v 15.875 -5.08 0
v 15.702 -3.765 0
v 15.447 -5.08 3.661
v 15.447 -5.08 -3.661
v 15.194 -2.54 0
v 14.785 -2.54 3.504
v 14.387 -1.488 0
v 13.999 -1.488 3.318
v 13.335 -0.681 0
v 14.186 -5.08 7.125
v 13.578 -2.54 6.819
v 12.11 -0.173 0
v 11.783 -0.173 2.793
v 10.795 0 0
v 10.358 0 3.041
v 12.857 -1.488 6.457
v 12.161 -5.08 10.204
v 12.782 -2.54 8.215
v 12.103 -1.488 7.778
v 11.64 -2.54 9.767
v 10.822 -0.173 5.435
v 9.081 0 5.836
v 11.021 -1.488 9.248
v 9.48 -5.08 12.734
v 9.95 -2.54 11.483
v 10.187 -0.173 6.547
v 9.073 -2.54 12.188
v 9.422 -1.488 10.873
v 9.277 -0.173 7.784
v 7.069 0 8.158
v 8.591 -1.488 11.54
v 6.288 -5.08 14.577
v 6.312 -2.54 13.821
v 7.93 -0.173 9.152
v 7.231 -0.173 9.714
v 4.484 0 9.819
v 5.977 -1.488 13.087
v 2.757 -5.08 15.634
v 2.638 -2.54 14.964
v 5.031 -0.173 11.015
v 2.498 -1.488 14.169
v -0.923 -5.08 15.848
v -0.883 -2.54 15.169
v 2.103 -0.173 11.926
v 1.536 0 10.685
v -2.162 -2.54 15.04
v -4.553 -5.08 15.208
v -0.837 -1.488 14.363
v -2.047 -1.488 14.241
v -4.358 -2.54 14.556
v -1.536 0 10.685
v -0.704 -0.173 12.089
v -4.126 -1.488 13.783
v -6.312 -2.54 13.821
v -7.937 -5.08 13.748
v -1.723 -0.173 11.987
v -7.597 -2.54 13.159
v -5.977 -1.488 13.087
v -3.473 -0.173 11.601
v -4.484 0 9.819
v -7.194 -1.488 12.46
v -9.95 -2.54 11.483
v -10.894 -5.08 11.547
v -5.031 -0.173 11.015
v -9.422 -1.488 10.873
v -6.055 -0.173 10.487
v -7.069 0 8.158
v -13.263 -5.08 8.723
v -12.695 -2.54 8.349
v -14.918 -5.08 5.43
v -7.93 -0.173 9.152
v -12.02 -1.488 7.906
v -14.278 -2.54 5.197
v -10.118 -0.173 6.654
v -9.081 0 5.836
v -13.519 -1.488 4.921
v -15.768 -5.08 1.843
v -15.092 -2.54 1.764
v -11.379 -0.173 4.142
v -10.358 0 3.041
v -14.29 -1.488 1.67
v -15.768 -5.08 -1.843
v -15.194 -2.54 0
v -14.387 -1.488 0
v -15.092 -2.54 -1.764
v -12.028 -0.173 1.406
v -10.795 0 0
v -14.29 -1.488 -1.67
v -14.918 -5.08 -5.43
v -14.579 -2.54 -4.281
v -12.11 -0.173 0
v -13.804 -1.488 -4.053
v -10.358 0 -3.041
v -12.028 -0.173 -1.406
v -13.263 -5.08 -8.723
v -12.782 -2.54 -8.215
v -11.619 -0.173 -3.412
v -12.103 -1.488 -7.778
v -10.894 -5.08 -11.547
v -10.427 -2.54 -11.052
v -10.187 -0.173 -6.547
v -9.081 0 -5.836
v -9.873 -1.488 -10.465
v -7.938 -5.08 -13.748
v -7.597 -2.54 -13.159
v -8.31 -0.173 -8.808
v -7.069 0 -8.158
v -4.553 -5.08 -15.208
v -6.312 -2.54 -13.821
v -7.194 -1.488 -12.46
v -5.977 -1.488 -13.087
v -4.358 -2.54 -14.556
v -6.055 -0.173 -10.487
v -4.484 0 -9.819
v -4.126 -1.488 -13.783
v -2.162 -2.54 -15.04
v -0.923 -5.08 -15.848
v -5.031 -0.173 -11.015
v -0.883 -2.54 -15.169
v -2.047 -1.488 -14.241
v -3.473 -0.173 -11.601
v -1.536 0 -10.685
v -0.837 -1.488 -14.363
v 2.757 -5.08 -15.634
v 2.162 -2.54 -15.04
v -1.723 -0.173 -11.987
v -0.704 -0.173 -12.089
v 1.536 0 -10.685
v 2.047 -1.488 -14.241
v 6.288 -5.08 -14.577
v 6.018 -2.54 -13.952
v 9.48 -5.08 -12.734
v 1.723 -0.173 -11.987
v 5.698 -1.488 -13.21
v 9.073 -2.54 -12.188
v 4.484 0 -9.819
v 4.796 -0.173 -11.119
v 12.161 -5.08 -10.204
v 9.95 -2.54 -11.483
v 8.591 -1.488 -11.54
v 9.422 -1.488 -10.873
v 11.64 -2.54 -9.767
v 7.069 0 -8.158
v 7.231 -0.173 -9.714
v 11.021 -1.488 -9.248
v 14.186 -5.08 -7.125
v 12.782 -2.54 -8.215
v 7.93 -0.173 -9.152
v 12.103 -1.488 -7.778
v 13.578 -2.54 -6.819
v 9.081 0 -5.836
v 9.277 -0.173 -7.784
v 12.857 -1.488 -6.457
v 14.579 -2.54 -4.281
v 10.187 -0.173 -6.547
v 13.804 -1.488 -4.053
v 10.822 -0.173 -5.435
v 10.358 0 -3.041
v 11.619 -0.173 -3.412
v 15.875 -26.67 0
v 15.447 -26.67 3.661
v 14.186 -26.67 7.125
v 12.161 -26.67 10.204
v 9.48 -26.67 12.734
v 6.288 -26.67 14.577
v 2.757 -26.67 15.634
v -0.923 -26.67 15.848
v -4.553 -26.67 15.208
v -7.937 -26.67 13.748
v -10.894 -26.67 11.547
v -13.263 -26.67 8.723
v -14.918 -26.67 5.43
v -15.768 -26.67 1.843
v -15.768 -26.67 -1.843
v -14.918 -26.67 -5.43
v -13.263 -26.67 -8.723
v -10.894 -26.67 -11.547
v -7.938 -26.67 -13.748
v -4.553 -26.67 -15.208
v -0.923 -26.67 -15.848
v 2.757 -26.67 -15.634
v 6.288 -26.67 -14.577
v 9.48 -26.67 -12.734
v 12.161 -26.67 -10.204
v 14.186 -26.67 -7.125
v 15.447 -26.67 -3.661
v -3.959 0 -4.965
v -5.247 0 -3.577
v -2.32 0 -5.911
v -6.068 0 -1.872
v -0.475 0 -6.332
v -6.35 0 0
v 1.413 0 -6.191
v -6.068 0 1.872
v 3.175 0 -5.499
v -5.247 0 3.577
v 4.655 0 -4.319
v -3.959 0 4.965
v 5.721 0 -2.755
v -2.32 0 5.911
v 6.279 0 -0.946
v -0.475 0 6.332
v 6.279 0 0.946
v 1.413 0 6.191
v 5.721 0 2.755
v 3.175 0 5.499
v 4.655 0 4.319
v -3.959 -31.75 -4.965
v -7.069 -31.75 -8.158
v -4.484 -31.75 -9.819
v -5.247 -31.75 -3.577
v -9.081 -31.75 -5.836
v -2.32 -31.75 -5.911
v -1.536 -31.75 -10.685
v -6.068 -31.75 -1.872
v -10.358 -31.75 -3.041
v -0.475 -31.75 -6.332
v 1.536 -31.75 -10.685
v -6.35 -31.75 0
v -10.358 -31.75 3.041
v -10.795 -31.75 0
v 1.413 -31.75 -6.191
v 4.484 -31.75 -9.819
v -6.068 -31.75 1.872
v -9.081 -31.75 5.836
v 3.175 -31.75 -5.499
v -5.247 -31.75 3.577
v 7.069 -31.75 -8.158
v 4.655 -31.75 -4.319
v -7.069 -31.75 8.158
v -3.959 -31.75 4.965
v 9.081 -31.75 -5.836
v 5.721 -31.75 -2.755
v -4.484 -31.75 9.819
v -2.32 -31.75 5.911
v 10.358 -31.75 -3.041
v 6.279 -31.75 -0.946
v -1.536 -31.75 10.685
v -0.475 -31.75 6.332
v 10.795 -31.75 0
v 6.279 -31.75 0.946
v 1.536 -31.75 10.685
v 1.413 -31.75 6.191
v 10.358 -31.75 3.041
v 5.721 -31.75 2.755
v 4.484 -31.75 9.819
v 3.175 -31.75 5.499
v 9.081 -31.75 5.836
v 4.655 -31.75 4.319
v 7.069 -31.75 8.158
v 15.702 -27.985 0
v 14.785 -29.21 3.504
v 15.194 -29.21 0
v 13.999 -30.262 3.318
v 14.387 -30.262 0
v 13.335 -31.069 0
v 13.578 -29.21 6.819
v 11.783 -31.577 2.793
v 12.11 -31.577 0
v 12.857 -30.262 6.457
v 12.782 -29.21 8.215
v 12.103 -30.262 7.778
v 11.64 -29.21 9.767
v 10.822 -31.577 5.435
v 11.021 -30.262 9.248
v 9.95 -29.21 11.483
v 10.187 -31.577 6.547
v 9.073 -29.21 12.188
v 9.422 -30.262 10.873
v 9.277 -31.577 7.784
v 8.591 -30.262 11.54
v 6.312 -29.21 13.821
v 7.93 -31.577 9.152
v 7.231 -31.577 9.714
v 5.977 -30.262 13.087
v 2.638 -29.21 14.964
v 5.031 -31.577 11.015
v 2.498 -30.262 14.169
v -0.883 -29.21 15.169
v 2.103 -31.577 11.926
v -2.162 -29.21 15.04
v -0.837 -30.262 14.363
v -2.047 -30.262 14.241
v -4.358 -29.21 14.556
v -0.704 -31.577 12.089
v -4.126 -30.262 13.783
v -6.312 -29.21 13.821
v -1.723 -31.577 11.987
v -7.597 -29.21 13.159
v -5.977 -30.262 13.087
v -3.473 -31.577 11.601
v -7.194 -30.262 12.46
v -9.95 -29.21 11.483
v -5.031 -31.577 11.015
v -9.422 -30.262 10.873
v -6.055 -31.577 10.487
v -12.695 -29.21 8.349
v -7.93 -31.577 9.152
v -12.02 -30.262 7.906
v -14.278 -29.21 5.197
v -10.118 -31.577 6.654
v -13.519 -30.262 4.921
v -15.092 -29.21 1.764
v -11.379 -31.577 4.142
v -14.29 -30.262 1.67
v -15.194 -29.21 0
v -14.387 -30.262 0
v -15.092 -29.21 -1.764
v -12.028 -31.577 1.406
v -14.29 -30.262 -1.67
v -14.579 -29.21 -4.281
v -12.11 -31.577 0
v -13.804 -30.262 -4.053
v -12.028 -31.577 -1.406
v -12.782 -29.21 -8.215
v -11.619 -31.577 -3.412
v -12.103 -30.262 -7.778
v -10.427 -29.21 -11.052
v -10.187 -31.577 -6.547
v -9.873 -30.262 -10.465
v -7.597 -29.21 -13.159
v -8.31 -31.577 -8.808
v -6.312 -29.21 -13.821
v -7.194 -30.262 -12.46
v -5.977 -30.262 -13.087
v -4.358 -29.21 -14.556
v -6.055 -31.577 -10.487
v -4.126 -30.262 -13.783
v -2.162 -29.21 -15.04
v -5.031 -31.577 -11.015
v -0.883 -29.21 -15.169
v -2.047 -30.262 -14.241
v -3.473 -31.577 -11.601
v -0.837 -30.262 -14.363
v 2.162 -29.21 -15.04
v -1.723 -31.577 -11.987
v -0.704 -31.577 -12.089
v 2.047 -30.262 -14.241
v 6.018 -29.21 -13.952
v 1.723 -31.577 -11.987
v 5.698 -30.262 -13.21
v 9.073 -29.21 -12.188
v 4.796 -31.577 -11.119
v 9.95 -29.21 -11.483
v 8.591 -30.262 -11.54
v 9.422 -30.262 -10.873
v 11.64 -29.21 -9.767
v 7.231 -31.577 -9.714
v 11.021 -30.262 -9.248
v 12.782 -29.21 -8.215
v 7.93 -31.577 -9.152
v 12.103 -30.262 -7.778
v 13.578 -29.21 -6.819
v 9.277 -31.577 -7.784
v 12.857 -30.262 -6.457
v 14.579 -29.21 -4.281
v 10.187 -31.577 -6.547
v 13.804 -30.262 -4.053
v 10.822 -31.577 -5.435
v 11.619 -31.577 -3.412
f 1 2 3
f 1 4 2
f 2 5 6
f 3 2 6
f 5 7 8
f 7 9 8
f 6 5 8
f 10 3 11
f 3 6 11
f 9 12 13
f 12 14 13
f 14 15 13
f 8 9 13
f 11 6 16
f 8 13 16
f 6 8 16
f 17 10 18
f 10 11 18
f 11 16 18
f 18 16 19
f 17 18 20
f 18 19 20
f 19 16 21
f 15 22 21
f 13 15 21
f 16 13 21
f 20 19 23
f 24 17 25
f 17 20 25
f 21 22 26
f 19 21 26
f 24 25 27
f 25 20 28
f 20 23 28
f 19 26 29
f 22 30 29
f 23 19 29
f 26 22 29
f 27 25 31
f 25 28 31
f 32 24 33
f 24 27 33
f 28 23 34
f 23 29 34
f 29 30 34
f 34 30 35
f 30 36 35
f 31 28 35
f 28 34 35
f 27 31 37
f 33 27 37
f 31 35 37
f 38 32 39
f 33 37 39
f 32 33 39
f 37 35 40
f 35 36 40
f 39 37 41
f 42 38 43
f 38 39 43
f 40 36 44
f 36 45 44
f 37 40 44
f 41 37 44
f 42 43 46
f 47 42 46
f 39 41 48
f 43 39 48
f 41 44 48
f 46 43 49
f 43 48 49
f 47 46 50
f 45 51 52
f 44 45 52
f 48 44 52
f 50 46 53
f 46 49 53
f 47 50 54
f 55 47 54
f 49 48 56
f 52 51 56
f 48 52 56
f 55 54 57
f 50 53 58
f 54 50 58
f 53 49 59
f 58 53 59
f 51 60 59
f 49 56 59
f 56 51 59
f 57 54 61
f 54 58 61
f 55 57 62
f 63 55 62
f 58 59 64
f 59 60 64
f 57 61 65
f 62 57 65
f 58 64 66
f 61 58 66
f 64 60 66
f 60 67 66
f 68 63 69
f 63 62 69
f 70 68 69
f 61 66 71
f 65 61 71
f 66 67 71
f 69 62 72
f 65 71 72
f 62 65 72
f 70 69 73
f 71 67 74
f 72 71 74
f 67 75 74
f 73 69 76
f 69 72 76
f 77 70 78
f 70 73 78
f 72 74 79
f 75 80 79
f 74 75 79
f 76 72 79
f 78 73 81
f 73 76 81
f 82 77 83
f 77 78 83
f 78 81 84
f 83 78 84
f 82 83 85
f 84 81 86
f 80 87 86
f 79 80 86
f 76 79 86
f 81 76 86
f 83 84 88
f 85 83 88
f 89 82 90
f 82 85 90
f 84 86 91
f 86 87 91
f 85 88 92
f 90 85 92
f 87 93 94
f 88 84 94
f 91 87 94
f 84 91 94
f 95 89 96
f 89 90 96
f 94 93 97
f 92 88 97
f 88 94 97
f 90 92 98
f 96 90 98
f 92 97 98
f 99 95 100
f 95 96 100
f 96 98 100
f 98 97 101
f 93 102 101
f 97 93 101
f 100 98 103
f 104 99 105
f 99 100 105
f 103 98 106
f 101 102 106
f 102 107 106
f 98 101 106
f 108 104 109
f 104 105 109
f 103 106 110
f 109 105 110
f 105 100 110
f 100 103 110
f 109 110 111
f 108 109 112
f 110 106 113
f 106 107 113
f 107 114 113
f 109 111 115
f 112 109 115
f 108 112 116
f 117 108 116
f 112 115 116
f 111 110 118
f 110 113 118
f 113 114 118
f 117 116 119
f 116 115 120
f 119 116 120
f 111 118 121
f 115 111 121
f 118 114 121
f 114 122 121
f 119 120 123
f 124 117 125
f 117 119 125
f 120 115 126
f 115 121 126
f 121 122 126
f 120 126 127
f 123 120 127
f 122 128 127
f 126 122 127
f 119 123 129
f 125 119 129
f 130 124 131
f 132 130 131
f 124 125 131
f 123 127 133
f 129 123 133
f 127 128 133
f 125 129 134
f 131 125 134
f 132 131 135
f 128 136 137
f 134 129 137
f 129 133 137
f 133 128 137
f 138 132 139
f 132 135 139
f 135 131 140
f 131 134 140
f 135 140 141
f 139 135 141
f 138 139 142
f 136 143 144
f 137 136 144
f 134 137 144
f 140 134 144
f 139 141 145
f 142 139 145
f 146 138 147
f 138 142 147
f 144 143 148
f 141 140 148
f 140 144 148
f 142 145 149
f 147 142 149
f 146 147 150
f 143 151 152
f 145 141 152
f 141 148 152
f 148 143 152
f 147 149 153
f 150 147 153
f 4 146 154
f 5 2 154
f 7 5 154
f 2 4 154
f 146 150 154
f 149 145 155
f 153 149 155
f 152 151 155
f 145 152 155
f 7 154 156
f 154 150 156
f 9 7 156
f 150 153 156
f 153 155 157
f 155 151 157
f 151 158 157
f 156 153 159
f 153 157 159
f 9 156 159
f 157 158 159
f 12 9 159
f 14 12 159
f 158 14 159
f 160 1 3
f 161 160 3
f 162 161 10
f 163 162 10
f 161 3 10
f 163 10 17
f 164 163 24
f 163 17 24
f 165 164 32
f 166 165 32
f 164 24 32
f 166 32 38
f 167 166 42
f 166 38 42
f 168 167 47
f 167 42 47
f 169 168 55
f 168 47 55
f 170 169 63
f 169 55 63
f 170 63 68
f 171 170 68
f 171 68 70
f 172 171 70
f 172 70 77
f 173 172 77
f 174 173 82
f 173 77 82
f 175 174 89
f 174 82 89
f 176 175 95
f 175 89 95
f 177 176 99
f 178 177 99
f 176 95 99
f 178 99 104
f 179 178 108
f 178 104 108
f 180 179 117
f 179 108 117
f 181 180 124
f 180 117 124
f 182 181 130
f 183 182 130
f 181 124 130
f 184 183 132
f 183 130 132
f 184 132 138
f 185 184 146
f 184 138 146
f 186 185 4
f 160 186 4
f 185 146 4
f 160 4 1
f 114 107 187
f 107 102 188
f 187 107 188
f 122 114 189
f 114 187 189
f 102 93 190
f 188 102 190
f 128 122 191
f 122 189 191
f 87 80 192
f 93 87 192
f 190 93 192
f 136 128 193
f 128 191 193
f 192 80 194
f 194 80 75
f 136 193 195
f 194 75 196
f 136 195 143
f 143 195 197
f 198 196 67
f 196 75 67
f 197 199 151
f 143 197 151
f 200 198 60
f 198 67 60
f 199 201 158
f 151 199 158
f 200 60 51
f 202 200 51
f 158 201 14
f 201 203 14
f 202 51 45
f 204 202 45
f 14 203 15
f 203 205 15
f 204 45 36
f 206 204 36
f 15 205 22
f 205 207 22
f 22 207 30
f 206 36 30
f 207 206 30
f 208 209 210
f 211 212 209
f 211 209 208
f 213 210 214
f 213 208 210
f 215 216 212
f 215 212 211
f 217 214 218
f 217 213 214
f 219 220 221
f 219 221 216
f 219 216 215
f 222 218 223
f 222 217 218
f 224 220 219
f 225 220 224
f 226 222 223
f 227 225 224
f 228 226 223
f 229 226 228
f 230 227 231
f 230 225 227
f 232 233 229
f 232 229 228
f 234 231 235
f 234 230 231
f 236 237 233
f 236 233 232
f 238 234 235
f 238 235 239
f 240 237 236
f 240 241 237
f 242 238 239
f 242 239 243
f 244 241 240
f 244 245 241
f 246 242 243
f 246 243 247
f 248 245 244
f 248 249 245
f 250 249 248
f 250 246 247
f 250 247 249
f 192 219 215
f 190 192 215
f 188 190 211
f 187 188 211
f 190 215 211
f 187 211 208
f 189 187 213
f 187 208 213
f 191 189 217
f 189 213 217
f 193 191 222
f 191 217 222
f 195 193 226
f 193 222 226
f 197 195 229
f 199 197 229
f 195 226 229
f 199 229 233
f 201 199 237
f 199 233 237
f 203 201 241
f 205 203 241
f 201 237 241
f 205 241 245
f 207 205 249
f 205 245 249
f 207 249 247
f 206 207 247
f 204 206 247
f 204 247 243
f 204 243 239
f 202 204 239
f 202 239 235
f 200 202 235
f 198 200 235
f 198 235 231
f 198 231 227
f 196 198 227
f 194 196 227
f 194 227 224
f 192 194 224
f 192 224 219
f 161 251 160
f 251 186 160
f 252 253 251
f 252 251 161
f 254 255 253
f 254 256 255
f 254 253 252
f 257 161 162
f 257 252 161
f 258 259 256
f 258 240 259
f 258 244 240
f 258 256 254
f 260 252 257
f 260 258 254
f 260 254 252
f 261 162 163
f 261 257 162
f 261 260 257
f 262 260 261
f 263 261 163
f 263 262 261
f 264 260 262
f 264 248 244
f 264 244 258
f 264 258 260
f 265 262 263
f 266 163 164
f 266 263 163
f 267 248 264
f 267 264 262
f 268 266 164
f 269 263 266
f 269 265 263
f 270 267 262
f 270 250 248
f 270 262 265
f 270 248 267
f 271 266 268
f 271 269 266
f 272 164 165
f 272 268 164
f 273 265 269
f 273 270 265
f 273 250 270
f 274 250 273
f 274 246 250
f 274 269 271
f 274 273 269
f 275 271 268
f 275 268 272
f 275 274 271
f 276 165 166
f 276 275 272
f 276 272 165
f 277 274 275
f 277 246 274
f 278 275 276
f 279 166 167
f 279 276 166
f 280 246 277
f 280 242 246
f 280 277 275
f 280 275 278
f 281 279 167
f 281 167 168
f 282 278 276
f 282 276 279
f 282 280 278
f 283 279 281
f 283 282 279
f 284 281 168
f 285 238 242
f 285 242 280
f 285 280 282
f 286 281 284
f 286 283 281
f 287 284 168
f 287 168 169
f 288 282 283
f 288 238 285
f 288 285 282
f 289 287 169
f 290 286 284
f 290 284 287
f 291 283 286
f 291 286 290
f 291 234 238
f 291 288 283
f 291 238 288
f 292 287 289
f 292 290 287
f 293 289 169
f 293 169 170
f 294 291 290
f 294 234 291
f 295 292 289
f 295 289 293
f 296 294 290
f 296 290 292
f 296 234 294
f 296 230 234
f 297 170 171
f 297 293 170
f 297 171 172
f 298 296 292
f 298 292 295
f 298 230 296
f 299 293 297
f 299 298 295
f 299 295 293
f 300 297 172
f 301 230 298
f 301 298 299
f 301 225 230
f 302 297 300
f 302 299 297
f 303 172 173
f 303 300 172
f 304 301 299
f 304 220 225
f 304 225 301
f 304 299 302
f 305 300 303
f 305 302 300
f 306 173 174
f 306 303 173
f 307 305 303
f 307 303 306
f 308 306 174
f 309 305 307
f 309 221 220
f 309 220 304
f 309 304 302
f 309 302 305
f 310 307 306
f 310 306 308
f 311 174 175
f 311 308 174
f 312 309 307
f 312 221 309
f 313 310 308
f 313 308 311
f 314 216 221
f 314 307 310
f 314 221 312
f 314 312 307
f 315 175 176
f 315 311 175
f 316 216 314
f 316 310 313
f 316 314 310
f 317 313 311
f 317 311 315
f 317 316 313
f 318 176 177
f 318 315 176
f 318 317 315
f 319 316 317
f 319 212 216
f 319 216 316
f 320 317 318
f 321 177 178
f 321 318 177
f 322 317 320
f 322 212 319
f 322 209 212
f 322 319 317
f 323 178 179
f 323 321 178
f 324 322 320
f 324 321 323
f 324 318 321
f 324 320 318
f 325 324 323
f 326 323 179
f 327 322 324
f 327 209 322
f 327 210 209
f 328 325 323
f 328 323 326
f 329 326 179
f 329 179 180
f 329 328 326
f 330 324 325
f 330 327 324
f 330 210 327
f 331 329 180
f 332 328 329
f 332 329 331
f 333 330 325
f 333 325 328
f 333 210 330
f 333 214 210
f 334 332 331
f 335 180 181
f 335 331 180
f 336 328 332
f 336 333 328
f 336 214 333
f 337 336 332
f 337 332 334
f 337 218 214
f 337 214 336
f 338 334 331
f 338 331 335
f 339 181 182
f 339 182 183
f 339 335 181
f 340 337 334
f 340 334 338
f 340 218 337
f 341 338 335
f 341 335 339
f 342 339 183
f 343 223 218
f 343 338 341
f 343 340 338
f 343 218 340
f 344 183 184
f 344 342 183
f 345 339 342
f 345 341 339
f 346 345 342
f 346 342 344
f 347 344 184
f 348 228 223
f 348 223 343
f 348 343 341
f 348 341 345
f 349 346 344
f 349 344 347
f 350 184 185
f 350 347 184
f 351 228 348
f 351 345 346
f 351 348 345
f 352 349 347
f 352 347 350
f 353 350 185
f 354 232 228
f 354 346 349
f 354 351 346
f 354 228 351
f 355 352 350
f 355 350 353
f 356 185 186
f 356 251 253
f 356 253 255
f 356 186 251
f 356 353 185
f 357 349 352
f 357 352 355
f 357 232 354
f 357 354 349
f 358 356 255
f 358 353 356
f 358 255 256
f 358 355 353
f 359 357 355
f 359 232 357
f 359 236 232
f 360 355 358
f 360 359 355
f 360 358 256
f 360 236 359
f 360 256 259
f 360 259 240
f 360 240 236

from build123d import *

# Parameters (mm, degrees)
F0_R     = 15.875
F1_DEPTH = 31.75
F3_D     = 12.7
F4_R     = 5.08


with BuildPart() as f1:
    # F0 (on Front) → F1 (new body)
    with BuildSketch(Plane.XZ):
        Circle(F0_R)
    extrude(amount=F1_DEPTH)

    # F3 (through all)
    with Locations(Plane(origin=(0, 0, 0), x_dir=(1, 0, 0), z_dir=(0, 1, 0))):
        with Locations((0, 0)):
            Hole(F3_D / 2)

    # F4
    f4_edges = [f1.edges().sort_by_distance(p)[0] for p in [
        (-15.875, -31.75, 0),
        (-15.875, 0, 0),
    ]]
    fillet(f4_edges, radius=F4_R)


solid = f1.part
